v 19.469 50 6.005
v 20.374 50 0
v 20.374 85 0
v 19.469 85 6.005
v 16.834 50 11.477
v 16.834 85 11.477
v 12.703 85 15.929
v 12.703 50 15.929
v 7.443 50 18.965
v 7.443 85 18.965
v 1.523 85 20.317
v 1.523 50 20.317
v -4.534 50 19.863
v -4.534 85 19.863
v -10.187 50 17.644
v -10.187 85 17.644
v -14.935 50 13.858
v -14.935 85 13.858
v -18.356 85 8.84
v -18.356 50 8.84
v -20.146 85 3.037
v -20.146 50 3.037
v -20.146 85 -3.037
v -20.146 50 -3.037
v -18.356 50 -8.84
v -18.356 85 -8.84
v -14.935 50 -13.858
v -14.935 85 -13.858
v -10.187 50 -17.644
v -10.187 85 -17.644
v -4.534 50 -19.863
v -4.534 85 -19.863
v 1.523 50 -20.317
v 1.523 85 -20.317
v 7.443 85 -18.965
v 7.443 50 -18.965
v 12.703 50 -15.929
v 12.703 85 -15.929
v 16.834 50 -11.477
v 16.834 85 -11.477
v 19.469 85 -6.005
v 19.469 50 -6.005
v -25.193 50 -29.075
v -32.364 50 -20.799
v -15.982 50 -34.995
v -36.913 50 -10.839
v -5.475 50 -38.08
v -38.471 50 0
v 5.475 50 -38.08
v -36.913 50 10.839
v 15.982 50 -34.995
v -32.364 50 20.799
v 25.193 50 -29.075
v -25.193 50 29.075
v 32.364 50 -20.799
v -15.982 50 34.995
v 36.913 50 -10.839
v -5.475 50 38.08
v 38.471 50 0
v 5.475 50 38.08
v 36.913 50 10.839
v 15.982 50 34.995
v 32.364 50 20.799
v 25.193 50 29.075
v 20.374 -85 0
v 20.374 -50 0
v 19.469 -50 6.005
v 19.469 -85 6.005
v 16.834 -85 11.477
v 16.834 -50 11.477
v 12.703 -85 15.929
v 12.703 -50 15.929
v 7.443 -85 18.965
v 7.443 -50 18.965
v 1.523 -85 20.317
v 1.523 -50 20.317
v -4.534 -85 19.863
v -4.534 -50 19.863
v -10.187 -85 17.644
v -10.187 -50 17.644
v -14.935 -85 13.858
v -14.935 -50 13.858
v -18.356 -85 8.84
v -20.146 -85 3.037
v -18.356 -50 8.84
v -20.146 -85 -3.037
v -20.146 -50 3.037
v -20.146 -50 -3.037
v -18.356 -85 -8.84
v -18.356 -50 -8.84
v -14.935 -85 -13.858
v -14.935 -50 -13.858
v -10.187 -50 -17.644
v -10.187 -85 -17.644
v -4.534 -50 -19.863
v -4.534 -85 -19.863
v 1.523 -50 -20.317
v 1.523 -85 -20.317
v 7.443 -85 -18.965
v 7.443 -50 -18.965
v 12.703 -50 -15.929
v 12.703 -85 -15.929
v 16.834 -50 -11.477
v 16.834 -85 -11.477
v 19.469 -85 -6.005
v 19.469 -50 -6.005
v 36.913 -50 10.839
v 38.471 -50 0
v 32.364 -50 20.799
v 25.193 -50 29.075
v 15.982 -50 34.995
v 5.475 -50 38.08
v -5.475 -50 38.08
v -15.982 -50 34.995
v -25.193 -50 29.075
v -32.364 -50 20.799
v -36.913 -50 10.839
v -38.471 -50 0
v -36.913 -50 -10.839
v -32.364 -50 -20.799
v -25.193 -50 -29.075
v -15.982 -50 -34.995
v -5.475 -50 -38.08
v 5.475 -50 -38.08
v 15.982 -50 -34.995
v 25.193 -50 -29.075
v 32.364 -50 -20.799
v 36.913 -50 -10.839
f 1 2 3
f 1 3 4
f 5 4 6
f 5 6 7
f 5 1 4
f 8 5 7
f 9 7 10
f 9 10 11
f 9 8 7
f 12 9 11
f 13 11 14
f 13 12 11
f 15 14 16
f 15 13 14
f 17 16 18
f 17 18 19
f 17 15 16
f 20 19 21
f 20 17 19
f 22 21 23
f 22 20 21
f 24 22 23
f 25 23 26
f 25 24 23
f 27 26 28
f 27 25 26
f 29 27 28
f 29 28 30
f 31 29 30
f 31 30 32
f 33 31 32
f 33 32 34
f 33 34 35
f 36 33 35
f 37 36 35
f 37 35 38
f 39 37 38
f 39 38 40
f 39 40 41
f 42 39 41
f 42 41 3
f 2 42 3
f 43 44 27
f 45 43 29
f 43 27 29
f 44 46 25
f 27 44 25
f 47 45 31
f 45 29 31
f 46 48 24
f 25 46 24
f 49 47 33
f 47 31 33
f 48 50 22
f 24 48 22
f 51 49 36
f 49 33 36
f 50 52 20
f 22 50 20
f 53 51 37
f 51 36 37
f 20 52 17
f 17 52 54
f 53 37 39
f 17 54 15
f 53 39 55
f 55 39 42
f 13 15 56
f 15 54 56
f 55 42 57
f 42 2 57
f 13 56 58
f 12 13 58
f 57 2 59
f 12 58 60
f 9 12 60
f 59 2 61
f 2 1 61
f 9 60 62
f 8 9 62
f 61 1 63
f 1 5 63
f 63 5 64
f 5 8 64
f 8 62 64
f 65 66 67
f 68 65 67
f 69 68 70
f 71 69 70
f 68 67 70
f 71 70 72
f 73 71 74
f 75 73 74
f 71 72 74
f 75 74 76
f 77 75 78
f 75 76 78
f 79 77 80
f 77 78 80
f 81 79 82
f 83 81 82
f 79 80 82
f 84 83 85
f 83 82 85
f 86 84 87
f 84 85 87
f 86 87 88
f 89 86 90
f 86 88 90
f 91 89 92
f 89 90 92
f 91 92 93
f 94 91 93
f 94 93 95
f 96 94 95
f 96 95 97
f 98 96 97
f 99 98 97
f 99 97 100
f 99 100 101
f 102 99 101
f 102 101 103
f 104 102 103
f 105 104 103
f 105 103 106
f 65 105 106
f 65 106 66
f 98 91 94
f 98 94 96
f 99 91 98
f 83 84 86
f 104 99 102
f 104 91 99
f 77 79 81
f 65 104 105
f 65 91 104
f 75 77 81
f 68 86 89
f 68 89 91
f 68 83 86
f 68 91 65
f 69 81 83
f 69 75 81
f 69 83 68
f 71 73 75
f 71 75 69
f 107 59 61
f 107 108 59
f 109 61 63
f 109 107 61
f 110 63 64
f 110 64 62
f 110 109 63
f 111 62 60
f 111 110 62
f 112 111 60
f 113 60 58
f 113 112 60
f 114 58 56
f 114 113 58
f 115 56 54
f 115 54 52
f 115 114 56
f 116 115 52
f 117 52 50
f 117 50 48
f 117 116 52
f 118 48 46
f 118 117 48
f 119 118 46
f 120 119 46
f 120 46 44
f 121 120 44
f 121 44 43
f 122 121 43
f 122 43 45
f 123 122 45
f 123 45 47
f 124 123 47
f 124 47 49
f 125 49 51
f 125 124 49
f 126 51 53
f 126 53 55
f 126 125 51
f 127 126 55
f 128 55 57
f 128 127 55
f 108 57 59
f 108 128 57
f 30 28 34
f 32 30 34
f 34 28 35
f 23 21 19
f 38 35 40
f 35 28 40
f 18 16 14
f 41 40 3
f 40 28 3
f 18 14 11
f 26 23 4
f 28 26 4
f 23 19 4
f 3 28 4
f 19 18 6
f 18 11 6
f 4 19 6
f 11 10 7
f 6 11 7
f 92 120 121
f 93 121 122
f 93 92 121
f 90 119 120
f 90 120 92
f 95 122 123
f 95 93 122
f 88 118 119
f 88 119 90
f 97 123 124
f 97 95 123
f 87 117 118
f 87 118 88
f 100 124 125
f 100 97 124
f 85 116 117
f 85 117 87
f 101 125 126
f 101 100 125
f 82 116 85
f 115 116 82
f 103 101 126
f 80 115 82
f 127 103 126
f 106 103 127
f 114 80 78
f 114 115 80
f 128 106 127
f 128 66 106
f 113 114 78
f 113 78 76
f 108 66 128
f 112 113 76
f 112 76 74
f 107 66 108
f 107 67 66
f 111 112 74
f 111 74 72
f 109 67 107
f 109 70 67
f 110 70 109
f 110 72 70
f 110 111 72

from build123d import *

# Parameters (mm, degrees)
F0_R     = 38.47128
F0_R_2   = 20.373798
F1_DEPTH = 50
F2_DEPTH = 85
F3_DEPTH = 85
F4_DEPTH = 50


with BuildPart() as f1:
    # F0 (on Front) → F1 (new body)
    with BuildSketch(Plane.XZ):
        Circle(F0_R)
        Circle(F0_R_2, mode=Mode.SUBTRACT)
    extrude(amount=F1_DEPTH)

    # F0 (on Front) → F2 (join)
    with BuildSketch(Plane.XZ):
        Circle(F0_R_2)
    extrude(amount=F2_DEPTH)

    # F0 (on Front) → F3 (join)
    with BuildSketch(Plane.XZ):
        Circle(F0_R_2)
    extrude(amount=-F3_DEPTH)

    # F0 (on Front) → F4 (join)
    with BuildSketch(Plane.XZ):
        Circle(F0_R)
        Circle(F0_R_2, mode=Mode.SUBTRACT)
    extrude(amount=-F4_DEPTH)


solid = f1.part
